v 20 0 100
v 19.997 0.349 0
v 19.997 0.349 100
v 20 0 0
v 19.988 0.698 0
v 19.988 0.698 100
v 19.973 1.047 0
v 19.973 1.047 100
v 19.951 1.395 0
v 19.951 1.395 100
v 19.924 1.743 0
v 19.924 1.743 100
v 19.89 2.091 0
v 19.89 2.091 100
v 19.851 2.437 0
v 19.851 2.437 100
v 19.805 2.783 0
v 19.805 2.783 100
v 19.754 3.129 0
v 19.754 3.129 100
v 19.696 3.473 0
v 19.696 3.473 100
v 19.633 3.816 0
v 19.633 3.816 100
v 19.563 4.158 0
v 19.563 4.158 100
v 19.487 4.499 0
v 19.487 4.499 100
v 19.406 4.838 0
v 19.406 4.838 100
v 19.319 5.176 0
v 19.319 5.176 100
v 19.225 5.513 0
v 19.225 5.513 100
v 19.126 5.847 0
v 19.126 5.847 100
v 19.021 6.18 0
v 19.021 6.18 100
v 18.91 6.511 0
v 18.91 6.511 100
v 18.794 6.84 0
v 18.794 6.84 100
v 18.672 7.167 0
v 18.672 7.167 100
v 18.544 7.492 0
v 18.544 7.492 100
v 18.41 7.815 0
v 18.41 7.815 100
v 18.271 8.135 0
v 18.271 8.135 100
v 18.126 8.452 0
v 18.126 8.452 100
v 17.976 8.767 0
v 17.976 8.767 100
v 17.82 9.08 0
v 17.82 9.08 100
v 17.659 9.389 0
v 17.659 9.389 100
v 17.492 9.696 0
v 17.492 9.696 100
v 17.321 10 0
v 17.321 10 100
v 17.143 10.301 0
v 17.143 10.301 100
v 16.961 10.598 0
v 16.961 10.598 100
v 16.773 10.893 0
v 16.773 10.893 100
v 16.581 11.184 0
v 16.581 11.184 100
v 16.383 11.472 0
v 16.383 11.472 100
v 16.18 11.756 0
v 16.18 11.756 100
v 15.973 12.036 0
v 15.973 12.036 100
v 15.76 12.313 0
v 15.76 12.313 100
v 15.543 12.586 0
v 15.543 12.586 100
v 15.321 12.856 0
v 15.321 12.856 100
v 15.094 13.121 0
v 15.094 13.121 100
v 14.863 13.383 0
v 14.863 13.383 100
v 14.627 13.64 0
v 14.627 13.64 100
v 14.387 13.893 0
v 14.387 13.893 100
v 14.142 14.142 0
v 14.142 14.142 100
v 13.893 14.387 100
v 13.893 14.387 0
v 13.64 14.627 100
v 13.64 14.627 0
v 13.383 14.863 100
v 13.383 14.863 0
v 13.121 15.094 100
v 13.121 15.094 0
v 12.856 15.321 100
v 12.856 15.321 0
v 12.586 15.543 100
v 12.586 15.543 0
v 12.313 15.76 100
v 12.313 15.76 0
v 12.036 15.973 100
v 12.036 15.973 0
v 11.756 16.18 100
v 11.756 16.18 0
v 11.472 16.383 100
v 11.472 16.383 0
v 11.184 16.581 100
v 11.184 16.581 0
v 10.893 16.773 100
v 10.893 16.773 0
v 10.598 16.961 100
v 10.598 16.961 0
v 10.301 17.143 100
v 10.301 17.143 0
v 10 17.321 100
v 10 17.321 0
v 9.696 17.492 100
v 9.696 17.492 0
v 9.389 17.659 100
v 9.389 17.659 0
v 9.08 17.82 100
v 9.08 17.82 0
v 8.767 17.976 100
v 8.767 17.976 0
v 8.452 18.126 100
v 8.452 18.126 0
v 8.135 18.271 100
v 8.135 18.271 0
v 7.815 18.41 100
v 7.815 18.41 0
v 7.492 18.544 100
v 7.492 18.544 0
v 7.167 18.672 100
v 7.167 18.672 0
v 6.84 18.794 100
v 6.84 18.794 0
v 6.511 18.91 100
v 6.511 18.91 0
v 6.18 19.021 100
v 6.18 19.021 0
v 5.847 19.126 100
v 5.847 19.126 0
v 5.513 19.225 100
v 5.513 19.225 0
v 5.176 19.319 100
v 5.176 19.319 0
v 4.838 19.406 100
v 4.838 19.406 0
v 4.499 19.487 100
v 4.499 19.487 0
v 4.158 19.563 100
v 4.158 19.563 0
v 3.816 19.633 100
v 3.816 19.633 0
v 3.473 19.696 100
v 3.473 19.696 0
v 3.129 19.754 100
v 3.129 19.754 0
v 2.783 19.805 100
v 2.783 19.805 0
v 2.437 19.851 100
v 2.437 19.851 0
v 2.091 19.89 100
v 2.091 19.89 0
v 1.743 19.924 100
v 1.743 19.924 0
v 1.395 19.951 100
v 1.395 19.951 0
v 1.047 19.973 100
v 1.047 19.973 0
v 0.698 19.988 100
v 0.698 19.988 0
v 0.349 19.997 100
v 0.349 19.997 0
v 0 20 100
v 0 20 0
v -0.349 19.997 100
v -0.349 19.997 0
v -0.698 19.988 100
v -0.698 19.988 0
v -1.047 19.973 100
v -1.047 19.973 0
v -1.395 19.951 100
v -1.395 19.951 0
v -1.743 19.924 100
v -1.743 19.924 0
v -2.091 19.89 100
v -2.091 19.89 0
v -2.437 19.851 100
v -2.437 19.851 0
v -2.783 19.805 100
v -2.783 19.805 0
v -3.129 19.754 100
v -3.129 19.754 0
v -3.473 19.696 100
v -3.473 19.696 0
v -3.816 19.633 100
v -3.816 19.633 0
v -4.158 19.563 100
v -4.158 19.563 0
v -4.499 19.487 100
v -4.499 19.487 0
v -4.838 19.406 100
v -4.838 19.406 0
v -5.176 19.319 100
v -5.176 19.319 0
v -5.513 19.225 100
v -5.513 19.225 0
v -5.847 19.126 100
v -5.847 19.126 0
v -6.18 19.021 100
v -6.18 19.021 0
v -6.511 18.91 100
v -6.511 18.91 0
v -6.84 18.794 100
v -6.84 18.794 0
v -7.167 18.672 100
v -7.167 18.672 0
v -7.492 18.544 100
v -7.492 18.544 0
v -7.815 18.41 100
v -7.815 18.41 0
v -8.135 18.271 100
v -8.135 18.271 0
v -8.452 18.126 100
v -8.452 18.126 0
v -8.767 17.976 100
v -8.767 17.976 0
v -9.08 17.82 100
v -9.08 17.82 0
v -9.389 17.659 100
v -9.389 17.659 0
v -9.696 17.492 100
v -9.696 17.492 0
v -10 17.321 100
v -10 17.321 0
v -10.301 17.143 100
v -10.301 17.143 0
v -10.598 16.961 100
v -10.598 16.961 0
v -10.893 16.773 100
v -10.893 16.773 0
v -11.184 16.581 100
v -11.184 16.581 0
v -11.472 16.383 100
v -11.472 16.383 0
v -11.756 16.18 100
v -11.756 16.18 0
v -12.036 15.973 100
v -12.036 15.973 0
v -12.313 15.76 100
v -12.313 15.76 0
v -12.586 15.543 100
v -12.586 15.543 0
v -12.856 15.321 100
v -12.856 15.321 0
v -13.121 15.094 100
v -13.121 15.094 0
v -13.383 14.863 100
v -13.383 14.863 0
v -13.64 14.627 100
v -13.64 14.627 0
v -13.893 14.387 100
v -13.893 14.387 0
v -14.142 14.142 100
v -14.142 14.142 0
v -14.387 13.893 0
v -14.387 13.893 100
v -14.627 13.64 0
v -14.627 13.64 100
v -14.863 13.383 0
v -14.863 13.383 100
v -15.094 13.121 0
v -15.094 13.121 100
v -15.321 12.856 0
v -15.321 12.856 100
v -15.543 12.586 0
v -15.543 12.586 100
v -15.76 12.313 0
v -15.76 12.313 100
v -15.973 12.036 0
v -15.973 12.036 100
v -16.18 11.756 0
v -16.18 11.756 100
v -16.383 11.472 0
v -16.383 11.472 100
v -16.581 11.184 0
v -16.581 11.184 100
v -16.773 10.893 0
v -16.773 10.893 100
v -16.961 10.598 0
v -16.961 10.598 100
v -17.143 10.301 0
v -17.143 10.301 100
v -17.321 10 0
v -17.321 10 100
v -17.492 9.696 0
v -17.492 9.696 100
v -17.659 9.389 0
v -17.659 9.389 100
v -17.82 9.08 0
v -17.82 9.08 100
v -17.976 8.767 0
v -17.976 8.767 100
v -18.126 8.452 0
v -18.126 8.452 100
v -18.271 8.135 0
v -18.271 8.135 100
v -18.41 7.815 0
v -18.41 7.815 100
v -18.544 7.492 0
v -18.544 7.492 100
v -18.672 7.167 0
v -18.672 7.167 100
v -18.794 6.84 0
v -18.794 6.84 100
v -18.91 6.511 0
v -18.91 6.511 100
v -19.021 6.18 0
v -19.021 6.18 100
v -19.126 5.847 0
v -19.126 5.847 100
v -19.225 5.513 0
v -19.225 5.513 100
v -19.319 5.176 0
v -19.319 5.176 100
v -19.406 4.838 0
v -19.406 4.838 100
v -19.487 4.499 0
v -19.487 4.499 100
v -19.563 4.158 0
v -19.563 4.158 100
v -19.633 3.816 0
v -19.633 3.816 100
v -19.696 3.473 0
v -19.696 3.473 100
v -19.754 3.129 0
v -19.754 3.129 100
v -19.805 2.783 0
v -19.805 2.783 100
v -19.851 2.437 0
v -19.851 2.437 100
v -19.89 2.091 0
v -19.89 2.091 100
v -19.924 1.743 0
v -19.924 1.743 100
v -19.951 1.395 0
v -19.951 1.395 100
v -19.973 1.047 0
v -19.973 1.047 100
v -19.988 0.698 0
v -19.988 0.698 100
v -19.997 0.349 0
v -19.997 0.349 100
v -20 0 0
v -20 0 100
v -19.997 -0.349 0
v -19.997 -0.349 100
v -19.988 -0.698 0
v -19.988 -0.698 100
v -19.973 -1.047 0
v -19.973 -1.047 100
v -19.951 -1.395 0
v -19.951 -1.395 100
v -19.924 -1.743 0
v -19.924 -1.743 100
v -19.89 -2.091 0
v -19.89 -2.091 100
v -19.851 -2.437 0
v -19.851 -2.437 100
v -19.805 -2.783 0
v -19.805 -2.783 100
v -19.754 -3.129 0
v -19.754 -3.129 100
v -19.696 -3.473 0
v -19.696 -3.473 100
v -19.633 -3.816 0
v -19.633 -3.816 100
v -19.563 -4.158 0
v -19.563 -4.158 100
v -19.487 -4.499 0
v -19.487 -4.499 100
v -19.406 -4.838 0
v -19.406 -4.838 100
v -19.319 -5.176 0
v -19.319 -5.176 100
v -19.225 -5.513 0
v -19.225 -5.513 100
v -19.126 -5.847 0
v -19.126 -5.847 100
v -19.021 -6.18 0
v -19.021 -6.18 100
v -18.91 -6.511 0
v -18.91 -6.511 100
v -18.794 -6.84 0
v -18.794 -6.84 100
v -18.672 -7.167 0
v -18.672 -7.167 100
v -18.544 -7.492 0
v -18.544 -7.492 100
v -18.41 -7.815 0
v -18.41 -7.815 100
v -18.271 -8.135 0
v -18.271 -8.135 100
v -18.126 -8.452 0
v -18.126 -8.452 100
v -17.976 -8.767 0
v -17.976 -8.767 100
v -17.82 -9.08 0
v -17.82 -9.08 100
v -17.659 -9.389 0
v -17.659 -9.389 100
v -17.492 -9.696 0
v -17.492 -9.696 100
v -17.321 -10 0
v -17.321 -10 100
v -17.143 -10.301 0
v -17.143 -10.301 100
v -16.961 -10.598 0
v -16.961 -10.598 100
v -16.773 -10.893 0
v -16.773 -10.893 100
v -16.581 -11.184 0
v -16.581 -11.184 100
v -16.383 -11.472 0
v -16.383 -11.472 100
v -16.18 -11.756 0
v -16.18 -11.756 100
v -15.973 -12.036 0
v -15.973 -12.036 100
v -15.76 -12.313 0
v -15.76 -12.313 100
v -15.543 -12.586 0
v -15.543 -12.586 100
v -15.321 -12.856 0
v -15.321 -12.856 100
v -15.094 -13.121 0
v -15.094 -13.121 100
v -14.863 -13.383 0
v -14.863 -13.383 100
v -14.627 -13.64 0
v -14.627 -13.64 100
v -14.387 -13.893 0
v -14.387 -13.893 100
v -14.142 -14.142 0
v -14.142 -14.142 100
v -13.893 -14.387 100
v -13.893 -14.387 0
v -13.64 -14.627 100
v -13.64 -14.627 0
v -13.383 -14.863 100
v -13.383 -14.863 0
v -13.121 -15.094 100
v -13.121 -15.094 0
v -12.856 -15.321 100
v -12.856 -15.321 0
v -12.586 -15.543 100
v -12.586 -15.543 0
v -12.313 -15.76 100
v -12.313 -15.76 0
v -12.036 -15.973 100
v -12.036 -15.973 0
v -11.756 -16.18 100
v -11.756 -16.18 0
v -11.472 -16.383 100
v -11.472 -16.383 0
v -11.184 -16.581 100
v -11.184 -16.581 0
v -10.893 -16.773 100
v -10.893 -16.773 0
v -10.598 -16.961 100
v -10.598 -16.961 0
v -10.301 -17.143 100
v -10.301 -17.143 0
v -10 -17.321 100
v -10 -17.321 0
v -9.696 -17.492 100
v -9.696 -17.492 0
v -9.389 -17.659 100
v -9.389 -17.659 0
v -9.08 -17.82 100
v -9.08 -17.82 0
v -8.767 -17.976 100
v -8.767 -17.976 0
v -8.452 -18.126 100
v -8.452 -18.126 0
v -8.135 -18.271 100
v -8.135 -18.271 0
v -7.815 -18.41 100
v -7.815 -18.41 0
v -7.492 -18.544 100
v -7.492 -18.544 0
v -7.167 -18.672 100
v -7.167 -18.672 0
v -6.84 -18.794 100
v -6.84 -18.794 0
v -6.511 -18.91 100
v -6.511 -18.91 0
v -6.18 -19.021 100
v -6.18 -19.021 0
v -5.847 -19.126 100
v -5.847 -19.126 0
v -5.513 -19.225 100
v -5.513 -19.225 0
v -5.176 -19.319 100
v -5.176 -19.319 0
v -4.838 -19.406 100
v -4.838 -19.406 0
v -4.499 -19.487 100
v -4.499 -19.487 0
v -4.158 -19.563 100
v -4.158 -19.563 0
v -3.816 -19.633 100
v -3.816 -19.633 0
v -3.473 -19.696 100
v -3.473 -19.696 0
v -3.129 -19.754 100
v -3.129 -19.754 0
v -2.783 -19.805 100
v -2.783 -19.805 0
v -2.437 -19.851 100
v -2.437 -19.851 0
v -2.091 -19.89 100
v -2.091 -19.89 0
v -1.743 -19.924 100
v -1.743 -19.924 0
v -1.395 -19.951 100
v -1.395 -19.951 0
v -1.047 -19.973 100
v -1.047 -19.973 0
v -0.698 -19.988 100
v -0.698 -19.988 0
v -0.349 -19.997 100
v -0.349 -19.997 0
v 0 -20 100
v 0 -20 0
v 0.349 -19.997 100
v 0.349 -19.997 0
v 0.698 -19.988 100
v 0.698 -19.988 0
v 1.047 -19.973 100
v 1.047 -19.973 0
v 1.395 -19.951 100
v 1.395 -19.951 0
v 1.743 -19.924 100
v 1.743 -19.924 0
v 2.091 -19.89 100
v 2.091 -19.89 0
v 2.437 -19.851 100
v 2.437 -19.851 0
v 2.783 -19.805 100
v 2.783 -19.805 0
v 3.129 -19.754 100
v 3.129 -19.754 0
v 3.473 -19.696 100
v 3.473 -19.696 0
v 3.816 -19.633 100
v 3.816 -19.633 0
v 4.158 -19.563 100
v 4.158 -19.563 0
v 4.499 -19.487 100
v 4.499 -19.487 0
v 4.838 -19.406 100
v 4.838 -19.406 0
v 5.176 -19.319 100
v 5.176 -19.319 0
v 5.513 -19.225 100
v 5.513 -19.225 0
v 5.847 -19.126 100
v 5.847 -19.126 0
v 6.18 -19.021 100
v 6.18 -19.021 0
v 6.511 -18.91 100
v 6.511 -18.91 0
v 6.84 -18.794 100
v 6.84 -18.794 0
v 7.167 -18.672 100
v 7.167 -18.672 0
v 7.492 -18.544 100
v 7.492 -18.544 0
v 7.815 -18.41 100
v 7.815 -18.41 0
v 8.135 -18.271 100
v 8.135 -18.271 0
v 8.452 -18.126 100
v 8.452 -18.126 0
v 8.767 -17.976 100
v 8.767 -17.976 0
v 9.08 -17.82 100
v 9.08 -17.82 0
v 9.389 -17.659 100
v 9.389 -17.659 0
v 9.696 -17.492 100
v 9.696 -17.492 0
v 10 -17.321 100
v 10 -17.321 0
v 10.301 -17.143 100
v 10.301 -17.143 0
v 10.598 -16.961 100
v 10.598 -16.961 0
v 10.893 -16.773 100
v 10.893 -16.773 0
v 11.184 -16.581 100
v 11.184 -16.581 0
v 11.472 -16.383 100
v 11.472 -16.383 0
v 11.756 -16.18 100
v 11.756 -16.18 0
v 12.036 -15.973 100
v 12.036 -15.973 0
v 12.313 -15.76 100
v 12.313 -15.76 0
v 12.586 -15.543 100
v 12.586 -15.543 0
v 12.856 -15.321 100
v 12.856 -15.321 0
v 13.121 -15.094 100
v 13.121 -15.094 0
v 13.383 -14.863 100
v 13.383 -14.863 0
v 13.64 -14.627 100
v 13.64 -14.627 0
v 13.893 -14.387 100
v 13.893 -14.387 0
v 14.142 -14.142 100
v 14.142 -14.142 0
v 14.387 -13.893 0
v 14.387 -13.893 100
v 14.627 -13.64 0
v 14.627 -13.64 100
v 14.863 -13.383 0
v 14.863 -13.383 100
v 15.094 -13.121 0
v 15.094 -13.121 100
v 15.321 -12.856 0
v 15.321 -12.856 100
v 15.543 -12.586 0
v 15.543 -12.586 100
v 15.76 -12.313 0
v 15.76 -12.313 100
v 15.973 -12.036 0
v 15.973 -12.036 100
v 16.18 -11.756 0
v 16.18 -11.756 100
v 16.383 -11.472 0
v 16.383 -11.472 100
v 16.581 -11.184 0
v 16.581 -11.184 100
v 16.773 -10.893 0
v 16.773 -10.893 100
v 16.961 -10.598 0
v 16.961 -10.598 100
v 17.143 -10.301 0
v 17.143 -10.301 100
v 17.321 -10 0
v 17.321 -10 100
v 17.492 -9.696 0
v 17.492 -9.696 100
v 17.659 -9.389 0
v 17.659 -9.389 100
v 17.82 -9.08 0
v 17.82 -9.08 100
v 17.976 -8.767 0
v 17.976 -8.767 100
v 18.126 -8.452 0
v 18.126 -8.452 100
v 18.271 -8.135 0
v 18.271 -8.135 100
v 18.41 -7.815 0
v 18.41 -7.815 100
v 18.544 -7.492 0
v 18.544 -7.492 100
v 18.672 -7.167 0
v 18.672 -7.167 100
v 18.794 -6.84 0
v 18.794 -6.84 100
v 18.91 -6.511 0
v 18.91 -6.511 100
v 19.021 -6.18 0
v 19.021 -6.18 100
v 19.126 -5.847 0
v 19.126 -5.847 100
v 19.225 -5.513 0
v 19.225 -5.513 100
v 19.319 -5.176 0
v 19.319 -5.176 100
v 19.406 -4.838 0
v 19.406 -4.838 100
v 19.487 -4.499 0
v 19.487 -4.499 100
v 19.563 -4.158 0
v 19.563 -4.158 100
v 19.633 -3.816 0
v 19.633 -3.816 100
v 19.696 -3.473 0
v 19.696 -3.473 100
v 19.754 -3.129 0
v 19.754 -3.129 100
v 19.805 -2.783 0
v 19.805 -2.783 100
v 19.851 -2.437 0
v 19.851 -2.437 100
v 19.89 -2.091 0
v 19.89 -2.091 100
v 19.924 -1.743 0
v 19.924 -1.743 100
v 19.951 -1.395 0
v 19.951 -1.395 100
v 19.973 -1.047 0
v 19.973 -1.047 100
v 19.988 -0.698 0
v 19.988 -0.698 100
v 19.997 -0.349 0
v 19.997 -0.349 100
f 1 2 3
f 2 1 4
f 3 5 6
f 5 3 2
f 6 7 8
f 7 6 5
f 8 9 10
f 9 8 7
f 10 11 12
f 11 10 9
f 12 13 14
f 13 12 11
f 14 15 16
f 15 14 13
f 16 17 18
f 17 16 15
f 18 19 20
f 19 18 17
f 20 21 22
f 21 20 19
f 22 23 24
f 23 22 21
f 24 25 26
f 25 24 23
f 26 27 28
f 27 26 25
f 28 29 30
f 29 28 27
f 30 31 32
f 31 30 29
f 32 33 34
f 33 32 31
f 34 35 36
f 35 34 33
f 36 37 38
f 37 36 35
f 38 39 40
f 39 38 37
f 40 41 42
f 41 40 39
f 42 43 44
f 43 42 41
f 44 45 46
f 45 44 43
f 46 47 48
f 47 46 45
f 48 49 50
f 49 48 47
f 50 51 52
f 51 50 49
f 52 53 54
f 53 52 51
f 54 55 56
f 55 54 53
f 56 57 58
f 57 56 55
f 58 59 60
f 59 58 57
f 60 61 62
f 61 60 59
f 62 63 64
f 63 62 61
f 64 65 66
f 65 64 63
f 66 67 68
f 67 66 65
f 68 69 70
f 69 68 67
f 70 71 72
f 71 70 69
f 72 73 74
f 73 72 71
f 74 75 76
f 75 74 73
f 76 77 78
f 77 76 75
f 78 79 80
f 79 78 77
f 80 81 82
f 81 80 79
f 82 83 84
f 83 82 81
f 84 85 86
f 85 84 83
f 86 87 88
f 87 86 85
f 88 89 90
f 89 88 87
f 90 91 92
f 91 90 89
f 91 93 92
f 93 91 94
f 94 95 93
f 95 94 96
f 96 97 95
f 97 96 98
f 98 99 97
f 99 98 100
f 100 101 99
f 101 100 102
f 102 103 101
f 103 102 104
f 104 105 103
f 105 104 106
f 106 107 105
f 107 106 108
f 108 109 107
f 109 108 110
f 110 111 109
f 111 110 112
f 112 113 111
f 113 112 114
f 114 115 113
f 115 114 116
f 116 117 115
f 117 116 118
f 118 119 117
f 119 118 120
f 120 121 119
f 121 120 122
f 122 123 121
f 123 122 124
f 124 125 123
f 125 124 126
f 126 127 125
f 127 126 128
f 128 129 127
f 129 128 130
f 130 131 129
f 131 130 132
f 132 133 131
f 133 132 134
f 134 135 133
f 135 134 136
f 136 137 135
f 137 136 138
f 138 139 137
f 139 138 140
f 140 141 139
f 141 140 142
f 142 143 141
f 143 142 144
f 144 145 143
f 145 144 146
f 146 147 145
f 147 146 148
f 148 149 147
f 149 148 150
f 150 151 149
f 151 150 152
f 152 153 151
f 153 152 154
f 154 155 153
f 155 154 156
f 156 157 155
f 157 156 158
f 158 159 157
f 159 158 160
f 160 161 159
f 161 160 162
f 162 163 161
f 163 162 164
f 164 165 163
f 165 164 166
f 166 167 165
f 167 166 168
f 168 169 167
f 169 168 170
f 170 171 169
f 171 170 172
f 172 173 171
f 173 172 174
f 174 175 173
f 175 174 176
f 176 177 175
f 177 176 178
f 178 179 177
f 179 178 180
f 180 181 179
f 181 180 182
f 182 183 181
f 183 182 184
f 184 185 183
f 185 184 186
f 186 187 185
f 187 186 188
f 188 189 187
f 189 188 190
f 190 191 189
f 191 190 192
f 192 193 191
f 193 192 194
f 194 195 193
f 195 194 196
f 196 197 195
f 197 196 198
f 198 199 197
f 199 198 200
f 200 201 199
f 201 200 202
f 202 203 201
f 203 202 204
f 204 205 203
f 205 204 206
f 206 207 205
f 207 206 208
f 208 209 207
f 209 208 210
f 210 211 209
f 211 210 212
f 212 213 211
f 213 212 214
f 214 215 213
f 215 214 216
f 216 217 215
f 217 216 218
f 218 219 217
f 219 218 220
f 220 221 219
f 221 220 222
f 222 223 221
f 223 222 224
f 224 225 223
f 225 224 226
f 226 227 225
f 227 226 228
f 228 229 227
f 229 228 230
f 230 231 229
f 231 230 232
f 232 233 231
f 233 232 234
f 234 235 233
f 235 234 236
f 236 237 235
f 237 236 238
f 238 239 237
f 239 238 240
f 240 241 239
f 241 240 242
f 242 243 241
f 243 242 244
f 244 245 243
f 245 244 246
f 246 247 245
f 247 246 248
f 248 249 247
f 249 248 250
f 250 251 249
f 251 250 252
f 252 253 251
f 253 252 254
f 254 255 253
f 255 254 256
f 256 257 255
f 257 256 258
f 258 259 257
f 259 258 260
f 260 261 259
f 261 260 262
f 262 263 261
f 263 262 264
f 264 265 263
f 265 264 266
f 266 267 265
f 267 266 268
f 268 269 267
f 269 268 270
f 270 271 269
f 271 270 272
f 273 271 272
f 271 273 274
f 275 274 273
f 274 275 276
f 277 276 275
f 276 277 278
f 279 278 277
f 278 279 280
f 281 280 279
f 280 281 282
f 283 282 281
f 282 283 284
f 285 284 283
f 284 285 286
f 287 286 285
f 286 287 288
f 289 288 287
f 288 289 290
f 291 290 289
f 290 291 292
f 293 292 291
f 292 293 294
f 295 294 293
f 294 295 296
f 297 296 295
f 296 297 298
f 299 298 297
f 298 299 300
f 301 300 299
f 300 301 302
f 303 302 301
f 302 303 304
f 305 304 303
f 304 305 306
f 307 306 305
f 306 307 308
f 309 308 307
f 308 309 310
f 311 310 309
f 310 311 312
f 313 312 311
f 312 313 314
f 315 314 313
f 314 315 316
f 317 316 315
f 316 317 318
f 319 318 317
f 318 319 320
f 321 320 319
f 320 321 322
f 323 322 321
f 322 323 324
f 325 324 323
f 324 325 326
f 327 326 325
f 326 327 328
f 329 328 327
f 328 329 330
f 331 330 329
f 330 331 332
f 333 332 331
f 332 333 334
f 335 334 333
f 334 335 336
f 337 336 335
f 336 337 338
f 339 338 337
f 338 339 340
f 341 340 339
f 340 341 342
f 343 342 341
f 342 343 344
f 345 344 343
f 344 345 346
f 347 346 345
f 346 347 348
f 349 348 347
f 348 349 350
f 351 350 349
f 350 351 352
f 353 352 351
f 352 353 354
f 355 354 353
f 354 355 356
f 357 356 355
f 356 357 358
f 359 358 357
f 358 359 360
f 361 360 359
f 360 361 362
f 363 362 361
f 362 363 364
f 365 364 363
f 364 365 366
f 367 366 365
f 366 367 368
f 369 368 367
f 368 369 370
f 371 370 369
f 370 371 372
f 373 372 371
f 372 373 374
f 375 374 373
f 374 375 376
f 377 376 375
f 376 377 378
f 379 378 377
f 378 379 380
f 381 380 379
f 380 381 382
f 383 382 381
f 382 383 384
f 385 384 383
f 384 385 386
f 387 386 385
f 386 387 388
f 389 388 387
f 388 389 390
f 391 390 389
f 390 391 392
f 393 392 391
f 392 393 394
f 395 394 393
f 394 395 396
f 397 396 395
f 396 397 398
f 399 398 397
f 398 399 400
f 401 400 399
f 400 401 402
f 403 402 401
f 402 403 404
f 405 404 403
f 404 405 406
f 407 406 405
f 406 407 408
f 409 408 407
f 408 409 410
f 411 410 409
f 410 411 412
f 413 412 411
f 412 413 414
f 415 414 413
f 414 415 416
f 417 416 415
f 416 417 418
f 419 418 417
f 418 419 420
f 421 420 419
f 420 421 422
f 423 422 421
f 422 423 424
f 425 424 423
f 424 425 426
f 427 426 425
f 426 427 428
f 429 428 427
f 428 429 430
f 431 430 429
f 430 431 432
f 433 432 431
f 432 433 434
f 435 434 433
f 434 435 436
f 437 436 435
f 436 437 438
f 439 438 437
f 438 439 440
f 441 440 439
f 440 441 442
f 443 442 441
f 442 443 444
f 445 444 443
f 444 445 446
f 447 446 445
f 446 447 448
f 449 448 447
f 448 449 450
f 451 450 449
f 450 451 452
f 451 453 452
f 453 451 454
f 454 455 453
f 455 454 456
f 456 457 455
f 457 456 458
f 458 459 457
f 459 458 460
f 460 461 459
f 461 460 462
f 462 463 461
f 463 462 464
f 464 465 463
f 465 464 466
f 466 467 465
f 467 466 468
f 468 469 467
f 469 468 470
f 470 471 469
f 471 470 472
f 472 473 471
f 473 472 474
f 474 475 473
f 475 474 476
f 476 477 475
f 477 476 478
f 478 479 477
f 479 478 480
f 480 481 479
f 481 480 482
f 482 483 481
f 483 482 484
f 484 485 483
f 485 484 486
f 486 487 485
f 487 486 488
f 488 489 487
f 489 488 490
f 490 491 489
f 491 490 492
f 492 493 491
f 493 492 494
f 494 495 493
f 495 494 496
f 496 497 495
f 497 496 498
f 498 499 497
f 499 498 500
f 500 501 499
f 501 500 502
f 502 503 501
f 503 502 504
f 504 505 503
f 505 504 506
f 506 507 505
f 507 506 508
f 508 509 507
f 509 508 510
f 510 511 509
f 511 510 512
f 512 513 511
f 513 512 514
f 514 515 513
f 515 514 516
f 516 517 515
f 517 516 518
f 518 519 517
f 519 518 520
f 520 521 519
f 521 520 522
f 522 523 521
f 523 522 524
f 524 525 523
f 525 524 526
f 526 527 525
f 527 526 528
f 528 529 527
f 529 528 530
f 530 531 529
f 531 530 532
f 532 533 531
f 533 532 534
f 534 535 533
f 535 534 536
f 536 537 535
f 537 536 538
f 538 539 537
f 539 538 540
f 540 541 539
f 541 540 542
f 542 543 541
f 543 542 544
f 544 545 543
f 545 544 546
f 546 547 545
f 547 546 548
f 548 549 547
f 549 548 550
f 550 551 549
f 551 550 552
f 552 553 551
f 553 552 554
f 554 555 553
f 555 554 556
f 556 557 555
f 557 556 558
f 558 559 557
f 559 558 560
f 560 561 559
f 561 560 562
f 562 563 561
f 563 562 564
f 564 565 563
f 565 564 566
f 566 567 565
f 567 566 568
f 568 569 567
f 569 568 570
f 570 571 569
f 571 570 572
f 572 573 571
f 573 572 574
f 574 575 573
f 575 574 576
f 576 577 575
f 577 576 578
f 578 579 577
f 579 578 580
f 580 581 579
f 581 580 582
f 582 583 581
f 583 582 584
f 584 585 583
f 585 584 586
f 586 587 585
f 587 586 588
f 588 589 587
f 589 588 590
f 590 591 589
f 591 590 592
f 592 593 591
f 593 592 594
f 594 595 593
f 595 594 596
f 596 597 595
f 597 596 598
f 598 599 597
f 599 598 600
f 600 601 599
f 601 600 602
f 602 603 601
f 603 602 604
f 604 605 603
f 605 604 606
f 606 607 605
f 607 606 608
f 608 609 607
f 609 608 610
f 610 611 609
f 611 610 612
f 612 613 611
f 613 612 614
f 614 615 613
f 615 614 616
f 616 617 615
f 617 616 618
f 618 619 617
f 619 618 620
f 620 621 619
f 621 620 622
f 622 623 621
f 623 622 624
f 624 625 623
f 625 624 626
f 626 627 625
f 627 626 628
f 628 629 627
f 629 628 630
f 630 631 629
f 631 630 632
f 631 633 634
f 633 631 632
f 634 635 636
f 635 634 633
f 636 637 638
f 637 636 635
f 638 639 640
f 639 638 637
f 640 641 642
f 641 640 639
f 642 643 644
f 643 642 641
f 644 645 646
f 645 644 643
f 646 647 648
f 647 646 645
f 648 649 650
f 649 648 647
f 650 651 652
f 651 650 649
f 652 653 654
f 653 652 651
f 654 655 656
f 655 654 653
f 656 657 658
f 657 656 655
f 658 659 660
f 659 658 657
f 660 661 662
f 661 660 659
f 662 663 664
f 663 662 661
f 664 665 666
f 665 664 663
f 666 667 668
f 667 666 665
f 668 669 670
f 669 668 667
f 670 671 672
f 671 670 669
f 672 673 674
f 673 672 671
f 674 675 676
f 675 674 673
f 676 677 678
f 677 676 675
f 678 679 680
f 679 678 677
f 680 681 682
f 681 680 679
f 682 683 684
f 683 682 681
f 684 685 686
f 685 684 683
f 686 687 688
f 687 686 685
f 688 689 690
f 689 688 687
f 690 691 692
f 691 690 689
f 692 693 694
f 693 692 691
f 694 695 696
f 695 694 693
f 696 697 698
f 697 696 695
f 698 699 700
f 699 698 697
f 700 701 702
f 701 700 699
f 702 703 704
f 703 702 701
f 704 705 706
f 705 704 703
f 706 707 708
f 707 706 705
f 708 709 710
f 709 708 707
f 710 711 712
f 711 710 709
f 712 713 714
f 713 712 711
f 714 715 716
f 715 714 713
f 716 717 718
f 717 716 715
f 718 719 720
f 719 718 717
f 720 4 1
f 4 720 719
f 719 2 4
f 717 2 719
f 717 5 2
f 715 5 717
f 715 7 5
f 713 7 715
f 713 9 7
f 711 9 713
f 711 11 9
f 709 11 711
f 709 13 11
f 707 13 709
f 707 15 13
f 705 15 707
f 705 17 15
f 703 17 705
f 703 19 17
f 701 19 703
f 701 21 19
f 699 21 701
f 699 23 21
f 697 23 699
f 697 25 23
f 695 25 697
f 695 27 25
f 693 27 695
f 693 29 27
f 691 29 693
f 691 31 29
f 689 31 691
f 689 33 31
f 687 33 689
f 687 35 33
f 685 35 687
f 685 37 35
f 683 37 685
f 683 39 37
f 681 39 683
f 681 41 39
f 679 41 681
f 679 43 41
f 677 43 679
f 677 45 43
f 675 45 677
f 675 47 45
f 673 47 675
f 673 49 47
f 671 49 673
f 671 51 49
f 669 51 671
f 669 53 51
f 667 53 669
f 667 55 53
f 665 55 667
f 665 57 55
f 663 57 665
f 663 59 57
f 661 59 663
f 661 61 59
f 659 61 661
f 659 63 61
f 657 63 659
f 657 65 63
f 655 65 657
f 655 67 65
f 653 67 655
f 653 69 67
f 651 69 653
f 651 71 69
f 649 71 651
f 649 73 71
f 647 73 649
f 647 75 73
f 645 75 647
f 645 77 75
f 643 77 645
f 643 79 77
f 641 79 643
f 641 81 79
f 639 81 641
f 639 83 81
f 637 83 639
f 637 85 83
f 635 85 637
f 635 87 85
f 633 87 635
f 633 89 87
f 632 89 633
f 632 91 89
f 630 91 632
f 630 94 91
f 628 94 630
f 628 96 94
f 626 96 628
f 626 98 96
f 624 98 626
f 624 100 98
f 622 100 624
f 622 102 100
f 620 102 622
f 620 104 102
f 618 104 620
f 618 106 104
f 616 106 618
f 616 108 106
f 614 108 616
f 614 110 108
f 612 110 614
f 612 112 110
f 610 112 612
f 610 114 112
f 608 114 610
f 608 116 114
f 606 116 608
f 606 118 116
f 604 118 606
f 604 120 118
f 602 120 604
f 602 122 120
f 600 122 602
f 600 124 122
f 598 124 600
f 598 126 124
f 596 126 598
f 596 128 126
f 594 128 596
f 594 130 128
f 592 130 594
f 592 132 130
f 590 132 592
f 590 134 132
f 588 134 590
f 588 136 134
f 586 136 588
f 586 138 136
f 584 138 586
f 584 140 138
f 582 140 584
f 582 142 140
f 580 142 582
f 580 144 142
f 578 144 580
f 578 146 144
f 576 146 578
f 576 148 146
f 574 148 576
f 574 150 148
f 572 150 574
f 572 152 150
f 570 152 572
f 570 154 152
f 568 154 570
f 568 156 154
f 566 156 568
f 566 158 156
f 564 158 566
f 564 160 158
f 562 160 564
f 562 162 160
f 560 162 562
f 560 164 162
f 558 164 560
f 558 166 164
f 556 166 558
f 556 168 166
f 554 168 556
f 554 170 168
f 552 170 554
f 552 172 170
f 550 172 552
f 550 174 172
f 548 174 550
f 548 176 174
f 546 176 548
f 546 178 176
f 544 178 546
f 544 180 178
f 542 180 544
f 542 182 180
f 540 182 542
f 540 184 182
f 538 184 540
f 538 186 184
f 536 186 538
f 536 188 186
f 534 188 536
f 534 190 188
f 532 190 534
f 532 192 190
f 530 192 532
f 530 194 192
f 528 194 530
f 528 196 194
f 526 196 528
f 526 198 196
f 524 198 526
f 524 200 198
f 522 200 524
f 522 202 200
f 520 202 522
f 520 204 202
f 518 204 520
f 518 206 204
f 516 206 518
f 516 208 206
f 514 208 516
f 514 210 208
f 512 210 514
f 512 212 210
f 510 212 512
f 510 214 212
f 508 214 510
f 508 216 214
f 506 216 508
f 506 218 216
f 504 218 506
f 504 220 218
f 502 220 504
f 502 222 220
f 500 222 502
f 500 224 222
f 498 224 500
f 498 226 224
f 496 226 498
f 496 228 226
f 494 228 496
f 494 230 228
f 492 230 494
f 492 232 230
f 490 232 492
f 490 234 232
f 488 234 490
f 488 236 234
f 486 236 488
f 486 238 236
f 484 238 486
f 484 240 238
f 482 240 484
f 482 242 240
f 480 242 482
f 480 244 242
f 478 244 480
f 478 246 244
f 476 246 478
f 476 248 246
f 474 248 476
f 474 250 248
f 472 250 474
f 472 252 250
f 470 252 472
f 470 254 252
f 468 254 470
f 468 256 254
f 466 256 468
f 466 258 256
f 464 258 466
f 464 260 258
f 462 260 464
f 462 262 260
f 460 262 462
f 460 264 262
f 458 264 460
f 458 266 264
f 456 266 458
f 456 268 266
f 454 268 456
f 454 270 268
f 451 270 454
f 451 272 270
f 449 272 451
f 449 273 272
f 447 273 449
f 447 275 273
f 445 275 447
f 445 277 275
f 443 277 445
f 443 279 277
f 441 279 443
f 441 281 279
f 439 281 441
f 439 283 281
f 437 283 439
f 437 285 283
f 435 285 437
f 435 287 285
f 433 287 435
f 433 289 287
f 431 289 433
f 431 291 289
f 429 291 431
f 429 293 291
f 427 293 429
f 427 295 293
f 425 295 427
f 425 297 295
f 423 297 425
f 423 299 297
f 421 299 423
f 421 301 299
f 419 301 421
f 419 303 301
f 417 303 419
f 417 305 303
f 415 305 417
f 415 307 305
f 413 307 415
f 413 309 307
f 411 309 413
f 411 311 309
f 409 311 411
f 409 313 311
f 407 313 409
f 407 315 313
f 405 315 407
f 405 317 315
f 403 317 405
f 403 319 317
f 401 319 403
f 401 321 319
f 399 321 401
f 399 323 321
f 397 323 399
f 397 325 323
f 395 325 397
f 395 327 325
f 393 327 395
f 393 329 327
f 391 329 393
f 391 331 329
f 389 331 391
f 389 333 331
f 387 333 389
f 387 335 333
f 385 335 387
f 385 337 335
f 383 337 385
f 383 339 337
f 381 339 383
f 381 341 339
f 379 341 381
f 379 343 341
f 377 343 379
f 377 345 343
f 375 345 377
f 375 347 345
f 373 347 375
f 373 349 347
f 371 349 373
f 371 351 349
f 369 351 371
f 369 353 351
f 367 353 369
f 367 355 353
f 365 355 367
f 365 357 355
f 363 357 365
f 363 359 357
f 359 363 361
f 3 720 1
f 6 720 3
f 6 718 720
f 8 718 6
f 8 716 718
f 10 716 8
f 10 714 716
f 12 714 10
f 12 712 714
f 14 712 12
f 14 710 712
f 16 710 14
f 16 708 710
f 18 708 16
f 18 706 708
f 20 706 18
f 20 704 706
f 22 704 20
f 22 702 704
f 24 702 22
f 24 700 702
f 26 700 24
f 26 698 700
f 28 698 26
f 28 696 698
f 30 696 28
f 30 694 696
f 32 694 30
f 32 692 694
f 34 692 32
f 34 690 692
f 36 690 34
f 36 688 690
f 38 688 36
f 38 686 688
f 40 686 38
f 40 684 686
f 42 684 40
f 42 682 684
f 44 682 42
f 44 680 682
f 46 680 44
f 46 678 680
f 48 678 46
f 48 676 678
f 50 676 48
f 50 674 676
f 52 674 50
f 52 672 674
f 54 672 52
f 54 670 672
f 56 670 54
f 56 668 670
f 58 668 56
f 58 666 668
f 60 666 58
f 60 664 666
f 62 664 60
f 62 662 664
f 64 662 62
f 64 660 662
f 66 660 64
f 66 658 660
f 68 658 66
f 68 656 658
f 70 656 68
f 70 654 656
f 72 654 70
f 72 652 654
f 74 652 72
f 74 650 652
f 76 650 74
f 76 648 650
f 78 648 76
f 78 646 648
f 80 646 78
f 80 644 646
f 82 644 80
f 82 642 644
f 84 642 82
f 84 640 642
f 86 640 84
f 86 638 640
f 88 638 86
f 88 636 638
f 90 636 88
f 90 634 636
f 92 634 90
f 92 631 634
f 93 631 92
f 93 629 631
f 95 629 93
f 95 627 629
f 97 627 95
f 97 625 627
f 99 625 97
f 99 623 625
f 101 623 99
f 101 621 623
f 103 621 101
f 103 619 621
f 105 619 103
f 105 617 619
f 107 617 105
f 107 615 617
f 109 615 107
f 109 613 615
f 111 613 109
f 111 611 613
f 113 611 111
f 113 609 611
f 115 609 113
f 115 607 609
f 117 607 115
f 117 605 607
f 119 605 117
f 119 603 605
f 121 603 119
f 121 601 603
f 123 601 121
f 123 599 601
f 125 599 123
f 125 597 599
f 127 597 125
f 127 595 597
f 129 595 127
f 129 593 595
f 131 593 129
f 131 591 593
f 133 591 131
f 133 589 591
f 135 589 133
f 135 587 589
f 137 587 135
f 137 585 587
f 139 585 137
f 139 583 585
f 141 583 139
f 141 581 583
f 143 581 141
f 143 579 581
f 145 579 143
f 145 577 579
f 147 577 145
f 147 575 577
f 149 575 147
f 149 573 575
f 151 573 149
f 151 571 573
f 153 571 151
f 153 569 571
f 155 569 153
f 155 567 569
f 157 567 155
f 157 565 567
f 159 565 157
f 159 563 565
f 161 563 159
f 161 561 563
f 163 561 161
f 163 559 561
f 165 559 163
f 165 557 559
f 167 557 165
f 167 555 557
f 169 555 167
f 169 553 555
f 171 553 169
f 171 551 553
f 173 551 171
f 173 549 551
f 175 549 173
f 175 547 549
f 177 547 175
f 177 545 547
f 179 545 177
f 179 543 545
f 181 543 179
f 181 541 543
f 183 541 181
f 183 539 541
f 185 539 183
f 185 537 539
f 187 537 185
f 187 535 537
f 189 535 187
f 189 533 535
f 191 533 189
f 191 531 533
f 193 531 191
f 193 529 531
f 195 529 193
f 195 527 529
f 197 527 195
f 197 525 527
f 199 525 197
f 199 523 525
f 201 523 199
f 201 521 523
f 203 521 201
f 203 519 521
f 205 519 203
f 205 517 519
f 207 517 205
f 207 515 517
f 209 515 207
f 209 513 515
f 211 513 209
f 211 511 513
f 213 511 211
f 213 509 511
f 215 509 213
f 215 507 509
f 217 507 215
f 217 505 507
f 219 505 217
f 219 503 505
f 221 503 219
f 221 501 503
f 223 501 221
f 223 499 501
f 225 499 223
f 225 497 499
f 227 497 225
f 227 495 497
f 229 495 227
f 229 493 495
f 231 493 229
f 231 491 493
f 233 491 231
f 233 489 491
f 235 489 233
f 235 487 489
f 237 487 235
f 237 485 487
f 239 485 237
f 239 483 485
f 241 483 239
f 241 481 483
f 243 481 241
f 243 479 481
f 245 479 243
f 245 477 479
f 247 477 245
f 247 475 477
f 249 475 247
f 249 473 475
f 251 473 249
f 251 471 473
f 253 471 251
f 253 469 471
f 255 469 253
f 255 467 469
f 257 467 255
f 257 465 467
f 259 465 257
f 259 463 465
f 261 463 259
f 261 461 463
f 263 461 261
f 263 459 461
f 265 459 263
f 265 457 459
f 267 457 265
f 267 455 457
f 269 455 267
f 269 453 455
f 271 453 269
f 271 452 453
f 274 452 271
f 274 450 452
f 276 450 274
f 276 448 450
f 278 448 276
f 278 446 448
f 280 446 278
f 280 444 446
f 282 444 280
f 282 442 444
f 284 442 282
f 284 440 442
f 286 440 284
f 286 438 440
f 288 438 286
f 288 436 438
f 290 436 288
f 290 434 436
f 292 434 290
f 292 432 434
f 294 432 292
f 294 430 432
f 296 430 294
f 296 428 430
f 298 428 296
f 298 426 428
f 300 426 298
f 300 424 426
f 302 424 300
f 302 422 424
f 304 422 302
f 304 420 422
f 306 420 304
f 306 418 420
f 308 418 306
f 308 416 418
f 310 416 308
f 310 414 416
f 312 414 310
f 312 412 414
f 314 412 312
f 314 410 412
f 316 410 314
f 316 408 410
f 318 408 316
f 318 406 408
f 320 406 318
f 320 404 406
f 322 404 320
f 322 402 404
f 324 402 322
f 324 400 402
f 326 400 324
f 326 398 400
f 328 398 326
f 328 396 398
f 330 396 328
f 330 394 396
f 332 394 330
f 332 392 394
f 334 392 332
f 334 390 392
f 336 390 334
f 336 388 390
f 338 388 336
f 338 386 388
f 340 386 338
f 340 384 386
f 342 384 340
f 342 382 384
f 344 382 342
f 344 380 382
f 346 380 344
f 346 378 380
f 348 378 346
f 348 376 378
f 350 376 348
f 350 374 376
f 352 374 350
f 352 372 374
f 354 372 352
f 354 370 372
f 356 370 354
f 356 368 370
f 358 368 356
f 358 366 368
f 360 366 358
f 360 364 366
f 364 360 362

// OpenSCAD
// Unit of length: Unit.INCH
cylinder(h = 100.0, d = 40.0, center = false, $fn = 360);
